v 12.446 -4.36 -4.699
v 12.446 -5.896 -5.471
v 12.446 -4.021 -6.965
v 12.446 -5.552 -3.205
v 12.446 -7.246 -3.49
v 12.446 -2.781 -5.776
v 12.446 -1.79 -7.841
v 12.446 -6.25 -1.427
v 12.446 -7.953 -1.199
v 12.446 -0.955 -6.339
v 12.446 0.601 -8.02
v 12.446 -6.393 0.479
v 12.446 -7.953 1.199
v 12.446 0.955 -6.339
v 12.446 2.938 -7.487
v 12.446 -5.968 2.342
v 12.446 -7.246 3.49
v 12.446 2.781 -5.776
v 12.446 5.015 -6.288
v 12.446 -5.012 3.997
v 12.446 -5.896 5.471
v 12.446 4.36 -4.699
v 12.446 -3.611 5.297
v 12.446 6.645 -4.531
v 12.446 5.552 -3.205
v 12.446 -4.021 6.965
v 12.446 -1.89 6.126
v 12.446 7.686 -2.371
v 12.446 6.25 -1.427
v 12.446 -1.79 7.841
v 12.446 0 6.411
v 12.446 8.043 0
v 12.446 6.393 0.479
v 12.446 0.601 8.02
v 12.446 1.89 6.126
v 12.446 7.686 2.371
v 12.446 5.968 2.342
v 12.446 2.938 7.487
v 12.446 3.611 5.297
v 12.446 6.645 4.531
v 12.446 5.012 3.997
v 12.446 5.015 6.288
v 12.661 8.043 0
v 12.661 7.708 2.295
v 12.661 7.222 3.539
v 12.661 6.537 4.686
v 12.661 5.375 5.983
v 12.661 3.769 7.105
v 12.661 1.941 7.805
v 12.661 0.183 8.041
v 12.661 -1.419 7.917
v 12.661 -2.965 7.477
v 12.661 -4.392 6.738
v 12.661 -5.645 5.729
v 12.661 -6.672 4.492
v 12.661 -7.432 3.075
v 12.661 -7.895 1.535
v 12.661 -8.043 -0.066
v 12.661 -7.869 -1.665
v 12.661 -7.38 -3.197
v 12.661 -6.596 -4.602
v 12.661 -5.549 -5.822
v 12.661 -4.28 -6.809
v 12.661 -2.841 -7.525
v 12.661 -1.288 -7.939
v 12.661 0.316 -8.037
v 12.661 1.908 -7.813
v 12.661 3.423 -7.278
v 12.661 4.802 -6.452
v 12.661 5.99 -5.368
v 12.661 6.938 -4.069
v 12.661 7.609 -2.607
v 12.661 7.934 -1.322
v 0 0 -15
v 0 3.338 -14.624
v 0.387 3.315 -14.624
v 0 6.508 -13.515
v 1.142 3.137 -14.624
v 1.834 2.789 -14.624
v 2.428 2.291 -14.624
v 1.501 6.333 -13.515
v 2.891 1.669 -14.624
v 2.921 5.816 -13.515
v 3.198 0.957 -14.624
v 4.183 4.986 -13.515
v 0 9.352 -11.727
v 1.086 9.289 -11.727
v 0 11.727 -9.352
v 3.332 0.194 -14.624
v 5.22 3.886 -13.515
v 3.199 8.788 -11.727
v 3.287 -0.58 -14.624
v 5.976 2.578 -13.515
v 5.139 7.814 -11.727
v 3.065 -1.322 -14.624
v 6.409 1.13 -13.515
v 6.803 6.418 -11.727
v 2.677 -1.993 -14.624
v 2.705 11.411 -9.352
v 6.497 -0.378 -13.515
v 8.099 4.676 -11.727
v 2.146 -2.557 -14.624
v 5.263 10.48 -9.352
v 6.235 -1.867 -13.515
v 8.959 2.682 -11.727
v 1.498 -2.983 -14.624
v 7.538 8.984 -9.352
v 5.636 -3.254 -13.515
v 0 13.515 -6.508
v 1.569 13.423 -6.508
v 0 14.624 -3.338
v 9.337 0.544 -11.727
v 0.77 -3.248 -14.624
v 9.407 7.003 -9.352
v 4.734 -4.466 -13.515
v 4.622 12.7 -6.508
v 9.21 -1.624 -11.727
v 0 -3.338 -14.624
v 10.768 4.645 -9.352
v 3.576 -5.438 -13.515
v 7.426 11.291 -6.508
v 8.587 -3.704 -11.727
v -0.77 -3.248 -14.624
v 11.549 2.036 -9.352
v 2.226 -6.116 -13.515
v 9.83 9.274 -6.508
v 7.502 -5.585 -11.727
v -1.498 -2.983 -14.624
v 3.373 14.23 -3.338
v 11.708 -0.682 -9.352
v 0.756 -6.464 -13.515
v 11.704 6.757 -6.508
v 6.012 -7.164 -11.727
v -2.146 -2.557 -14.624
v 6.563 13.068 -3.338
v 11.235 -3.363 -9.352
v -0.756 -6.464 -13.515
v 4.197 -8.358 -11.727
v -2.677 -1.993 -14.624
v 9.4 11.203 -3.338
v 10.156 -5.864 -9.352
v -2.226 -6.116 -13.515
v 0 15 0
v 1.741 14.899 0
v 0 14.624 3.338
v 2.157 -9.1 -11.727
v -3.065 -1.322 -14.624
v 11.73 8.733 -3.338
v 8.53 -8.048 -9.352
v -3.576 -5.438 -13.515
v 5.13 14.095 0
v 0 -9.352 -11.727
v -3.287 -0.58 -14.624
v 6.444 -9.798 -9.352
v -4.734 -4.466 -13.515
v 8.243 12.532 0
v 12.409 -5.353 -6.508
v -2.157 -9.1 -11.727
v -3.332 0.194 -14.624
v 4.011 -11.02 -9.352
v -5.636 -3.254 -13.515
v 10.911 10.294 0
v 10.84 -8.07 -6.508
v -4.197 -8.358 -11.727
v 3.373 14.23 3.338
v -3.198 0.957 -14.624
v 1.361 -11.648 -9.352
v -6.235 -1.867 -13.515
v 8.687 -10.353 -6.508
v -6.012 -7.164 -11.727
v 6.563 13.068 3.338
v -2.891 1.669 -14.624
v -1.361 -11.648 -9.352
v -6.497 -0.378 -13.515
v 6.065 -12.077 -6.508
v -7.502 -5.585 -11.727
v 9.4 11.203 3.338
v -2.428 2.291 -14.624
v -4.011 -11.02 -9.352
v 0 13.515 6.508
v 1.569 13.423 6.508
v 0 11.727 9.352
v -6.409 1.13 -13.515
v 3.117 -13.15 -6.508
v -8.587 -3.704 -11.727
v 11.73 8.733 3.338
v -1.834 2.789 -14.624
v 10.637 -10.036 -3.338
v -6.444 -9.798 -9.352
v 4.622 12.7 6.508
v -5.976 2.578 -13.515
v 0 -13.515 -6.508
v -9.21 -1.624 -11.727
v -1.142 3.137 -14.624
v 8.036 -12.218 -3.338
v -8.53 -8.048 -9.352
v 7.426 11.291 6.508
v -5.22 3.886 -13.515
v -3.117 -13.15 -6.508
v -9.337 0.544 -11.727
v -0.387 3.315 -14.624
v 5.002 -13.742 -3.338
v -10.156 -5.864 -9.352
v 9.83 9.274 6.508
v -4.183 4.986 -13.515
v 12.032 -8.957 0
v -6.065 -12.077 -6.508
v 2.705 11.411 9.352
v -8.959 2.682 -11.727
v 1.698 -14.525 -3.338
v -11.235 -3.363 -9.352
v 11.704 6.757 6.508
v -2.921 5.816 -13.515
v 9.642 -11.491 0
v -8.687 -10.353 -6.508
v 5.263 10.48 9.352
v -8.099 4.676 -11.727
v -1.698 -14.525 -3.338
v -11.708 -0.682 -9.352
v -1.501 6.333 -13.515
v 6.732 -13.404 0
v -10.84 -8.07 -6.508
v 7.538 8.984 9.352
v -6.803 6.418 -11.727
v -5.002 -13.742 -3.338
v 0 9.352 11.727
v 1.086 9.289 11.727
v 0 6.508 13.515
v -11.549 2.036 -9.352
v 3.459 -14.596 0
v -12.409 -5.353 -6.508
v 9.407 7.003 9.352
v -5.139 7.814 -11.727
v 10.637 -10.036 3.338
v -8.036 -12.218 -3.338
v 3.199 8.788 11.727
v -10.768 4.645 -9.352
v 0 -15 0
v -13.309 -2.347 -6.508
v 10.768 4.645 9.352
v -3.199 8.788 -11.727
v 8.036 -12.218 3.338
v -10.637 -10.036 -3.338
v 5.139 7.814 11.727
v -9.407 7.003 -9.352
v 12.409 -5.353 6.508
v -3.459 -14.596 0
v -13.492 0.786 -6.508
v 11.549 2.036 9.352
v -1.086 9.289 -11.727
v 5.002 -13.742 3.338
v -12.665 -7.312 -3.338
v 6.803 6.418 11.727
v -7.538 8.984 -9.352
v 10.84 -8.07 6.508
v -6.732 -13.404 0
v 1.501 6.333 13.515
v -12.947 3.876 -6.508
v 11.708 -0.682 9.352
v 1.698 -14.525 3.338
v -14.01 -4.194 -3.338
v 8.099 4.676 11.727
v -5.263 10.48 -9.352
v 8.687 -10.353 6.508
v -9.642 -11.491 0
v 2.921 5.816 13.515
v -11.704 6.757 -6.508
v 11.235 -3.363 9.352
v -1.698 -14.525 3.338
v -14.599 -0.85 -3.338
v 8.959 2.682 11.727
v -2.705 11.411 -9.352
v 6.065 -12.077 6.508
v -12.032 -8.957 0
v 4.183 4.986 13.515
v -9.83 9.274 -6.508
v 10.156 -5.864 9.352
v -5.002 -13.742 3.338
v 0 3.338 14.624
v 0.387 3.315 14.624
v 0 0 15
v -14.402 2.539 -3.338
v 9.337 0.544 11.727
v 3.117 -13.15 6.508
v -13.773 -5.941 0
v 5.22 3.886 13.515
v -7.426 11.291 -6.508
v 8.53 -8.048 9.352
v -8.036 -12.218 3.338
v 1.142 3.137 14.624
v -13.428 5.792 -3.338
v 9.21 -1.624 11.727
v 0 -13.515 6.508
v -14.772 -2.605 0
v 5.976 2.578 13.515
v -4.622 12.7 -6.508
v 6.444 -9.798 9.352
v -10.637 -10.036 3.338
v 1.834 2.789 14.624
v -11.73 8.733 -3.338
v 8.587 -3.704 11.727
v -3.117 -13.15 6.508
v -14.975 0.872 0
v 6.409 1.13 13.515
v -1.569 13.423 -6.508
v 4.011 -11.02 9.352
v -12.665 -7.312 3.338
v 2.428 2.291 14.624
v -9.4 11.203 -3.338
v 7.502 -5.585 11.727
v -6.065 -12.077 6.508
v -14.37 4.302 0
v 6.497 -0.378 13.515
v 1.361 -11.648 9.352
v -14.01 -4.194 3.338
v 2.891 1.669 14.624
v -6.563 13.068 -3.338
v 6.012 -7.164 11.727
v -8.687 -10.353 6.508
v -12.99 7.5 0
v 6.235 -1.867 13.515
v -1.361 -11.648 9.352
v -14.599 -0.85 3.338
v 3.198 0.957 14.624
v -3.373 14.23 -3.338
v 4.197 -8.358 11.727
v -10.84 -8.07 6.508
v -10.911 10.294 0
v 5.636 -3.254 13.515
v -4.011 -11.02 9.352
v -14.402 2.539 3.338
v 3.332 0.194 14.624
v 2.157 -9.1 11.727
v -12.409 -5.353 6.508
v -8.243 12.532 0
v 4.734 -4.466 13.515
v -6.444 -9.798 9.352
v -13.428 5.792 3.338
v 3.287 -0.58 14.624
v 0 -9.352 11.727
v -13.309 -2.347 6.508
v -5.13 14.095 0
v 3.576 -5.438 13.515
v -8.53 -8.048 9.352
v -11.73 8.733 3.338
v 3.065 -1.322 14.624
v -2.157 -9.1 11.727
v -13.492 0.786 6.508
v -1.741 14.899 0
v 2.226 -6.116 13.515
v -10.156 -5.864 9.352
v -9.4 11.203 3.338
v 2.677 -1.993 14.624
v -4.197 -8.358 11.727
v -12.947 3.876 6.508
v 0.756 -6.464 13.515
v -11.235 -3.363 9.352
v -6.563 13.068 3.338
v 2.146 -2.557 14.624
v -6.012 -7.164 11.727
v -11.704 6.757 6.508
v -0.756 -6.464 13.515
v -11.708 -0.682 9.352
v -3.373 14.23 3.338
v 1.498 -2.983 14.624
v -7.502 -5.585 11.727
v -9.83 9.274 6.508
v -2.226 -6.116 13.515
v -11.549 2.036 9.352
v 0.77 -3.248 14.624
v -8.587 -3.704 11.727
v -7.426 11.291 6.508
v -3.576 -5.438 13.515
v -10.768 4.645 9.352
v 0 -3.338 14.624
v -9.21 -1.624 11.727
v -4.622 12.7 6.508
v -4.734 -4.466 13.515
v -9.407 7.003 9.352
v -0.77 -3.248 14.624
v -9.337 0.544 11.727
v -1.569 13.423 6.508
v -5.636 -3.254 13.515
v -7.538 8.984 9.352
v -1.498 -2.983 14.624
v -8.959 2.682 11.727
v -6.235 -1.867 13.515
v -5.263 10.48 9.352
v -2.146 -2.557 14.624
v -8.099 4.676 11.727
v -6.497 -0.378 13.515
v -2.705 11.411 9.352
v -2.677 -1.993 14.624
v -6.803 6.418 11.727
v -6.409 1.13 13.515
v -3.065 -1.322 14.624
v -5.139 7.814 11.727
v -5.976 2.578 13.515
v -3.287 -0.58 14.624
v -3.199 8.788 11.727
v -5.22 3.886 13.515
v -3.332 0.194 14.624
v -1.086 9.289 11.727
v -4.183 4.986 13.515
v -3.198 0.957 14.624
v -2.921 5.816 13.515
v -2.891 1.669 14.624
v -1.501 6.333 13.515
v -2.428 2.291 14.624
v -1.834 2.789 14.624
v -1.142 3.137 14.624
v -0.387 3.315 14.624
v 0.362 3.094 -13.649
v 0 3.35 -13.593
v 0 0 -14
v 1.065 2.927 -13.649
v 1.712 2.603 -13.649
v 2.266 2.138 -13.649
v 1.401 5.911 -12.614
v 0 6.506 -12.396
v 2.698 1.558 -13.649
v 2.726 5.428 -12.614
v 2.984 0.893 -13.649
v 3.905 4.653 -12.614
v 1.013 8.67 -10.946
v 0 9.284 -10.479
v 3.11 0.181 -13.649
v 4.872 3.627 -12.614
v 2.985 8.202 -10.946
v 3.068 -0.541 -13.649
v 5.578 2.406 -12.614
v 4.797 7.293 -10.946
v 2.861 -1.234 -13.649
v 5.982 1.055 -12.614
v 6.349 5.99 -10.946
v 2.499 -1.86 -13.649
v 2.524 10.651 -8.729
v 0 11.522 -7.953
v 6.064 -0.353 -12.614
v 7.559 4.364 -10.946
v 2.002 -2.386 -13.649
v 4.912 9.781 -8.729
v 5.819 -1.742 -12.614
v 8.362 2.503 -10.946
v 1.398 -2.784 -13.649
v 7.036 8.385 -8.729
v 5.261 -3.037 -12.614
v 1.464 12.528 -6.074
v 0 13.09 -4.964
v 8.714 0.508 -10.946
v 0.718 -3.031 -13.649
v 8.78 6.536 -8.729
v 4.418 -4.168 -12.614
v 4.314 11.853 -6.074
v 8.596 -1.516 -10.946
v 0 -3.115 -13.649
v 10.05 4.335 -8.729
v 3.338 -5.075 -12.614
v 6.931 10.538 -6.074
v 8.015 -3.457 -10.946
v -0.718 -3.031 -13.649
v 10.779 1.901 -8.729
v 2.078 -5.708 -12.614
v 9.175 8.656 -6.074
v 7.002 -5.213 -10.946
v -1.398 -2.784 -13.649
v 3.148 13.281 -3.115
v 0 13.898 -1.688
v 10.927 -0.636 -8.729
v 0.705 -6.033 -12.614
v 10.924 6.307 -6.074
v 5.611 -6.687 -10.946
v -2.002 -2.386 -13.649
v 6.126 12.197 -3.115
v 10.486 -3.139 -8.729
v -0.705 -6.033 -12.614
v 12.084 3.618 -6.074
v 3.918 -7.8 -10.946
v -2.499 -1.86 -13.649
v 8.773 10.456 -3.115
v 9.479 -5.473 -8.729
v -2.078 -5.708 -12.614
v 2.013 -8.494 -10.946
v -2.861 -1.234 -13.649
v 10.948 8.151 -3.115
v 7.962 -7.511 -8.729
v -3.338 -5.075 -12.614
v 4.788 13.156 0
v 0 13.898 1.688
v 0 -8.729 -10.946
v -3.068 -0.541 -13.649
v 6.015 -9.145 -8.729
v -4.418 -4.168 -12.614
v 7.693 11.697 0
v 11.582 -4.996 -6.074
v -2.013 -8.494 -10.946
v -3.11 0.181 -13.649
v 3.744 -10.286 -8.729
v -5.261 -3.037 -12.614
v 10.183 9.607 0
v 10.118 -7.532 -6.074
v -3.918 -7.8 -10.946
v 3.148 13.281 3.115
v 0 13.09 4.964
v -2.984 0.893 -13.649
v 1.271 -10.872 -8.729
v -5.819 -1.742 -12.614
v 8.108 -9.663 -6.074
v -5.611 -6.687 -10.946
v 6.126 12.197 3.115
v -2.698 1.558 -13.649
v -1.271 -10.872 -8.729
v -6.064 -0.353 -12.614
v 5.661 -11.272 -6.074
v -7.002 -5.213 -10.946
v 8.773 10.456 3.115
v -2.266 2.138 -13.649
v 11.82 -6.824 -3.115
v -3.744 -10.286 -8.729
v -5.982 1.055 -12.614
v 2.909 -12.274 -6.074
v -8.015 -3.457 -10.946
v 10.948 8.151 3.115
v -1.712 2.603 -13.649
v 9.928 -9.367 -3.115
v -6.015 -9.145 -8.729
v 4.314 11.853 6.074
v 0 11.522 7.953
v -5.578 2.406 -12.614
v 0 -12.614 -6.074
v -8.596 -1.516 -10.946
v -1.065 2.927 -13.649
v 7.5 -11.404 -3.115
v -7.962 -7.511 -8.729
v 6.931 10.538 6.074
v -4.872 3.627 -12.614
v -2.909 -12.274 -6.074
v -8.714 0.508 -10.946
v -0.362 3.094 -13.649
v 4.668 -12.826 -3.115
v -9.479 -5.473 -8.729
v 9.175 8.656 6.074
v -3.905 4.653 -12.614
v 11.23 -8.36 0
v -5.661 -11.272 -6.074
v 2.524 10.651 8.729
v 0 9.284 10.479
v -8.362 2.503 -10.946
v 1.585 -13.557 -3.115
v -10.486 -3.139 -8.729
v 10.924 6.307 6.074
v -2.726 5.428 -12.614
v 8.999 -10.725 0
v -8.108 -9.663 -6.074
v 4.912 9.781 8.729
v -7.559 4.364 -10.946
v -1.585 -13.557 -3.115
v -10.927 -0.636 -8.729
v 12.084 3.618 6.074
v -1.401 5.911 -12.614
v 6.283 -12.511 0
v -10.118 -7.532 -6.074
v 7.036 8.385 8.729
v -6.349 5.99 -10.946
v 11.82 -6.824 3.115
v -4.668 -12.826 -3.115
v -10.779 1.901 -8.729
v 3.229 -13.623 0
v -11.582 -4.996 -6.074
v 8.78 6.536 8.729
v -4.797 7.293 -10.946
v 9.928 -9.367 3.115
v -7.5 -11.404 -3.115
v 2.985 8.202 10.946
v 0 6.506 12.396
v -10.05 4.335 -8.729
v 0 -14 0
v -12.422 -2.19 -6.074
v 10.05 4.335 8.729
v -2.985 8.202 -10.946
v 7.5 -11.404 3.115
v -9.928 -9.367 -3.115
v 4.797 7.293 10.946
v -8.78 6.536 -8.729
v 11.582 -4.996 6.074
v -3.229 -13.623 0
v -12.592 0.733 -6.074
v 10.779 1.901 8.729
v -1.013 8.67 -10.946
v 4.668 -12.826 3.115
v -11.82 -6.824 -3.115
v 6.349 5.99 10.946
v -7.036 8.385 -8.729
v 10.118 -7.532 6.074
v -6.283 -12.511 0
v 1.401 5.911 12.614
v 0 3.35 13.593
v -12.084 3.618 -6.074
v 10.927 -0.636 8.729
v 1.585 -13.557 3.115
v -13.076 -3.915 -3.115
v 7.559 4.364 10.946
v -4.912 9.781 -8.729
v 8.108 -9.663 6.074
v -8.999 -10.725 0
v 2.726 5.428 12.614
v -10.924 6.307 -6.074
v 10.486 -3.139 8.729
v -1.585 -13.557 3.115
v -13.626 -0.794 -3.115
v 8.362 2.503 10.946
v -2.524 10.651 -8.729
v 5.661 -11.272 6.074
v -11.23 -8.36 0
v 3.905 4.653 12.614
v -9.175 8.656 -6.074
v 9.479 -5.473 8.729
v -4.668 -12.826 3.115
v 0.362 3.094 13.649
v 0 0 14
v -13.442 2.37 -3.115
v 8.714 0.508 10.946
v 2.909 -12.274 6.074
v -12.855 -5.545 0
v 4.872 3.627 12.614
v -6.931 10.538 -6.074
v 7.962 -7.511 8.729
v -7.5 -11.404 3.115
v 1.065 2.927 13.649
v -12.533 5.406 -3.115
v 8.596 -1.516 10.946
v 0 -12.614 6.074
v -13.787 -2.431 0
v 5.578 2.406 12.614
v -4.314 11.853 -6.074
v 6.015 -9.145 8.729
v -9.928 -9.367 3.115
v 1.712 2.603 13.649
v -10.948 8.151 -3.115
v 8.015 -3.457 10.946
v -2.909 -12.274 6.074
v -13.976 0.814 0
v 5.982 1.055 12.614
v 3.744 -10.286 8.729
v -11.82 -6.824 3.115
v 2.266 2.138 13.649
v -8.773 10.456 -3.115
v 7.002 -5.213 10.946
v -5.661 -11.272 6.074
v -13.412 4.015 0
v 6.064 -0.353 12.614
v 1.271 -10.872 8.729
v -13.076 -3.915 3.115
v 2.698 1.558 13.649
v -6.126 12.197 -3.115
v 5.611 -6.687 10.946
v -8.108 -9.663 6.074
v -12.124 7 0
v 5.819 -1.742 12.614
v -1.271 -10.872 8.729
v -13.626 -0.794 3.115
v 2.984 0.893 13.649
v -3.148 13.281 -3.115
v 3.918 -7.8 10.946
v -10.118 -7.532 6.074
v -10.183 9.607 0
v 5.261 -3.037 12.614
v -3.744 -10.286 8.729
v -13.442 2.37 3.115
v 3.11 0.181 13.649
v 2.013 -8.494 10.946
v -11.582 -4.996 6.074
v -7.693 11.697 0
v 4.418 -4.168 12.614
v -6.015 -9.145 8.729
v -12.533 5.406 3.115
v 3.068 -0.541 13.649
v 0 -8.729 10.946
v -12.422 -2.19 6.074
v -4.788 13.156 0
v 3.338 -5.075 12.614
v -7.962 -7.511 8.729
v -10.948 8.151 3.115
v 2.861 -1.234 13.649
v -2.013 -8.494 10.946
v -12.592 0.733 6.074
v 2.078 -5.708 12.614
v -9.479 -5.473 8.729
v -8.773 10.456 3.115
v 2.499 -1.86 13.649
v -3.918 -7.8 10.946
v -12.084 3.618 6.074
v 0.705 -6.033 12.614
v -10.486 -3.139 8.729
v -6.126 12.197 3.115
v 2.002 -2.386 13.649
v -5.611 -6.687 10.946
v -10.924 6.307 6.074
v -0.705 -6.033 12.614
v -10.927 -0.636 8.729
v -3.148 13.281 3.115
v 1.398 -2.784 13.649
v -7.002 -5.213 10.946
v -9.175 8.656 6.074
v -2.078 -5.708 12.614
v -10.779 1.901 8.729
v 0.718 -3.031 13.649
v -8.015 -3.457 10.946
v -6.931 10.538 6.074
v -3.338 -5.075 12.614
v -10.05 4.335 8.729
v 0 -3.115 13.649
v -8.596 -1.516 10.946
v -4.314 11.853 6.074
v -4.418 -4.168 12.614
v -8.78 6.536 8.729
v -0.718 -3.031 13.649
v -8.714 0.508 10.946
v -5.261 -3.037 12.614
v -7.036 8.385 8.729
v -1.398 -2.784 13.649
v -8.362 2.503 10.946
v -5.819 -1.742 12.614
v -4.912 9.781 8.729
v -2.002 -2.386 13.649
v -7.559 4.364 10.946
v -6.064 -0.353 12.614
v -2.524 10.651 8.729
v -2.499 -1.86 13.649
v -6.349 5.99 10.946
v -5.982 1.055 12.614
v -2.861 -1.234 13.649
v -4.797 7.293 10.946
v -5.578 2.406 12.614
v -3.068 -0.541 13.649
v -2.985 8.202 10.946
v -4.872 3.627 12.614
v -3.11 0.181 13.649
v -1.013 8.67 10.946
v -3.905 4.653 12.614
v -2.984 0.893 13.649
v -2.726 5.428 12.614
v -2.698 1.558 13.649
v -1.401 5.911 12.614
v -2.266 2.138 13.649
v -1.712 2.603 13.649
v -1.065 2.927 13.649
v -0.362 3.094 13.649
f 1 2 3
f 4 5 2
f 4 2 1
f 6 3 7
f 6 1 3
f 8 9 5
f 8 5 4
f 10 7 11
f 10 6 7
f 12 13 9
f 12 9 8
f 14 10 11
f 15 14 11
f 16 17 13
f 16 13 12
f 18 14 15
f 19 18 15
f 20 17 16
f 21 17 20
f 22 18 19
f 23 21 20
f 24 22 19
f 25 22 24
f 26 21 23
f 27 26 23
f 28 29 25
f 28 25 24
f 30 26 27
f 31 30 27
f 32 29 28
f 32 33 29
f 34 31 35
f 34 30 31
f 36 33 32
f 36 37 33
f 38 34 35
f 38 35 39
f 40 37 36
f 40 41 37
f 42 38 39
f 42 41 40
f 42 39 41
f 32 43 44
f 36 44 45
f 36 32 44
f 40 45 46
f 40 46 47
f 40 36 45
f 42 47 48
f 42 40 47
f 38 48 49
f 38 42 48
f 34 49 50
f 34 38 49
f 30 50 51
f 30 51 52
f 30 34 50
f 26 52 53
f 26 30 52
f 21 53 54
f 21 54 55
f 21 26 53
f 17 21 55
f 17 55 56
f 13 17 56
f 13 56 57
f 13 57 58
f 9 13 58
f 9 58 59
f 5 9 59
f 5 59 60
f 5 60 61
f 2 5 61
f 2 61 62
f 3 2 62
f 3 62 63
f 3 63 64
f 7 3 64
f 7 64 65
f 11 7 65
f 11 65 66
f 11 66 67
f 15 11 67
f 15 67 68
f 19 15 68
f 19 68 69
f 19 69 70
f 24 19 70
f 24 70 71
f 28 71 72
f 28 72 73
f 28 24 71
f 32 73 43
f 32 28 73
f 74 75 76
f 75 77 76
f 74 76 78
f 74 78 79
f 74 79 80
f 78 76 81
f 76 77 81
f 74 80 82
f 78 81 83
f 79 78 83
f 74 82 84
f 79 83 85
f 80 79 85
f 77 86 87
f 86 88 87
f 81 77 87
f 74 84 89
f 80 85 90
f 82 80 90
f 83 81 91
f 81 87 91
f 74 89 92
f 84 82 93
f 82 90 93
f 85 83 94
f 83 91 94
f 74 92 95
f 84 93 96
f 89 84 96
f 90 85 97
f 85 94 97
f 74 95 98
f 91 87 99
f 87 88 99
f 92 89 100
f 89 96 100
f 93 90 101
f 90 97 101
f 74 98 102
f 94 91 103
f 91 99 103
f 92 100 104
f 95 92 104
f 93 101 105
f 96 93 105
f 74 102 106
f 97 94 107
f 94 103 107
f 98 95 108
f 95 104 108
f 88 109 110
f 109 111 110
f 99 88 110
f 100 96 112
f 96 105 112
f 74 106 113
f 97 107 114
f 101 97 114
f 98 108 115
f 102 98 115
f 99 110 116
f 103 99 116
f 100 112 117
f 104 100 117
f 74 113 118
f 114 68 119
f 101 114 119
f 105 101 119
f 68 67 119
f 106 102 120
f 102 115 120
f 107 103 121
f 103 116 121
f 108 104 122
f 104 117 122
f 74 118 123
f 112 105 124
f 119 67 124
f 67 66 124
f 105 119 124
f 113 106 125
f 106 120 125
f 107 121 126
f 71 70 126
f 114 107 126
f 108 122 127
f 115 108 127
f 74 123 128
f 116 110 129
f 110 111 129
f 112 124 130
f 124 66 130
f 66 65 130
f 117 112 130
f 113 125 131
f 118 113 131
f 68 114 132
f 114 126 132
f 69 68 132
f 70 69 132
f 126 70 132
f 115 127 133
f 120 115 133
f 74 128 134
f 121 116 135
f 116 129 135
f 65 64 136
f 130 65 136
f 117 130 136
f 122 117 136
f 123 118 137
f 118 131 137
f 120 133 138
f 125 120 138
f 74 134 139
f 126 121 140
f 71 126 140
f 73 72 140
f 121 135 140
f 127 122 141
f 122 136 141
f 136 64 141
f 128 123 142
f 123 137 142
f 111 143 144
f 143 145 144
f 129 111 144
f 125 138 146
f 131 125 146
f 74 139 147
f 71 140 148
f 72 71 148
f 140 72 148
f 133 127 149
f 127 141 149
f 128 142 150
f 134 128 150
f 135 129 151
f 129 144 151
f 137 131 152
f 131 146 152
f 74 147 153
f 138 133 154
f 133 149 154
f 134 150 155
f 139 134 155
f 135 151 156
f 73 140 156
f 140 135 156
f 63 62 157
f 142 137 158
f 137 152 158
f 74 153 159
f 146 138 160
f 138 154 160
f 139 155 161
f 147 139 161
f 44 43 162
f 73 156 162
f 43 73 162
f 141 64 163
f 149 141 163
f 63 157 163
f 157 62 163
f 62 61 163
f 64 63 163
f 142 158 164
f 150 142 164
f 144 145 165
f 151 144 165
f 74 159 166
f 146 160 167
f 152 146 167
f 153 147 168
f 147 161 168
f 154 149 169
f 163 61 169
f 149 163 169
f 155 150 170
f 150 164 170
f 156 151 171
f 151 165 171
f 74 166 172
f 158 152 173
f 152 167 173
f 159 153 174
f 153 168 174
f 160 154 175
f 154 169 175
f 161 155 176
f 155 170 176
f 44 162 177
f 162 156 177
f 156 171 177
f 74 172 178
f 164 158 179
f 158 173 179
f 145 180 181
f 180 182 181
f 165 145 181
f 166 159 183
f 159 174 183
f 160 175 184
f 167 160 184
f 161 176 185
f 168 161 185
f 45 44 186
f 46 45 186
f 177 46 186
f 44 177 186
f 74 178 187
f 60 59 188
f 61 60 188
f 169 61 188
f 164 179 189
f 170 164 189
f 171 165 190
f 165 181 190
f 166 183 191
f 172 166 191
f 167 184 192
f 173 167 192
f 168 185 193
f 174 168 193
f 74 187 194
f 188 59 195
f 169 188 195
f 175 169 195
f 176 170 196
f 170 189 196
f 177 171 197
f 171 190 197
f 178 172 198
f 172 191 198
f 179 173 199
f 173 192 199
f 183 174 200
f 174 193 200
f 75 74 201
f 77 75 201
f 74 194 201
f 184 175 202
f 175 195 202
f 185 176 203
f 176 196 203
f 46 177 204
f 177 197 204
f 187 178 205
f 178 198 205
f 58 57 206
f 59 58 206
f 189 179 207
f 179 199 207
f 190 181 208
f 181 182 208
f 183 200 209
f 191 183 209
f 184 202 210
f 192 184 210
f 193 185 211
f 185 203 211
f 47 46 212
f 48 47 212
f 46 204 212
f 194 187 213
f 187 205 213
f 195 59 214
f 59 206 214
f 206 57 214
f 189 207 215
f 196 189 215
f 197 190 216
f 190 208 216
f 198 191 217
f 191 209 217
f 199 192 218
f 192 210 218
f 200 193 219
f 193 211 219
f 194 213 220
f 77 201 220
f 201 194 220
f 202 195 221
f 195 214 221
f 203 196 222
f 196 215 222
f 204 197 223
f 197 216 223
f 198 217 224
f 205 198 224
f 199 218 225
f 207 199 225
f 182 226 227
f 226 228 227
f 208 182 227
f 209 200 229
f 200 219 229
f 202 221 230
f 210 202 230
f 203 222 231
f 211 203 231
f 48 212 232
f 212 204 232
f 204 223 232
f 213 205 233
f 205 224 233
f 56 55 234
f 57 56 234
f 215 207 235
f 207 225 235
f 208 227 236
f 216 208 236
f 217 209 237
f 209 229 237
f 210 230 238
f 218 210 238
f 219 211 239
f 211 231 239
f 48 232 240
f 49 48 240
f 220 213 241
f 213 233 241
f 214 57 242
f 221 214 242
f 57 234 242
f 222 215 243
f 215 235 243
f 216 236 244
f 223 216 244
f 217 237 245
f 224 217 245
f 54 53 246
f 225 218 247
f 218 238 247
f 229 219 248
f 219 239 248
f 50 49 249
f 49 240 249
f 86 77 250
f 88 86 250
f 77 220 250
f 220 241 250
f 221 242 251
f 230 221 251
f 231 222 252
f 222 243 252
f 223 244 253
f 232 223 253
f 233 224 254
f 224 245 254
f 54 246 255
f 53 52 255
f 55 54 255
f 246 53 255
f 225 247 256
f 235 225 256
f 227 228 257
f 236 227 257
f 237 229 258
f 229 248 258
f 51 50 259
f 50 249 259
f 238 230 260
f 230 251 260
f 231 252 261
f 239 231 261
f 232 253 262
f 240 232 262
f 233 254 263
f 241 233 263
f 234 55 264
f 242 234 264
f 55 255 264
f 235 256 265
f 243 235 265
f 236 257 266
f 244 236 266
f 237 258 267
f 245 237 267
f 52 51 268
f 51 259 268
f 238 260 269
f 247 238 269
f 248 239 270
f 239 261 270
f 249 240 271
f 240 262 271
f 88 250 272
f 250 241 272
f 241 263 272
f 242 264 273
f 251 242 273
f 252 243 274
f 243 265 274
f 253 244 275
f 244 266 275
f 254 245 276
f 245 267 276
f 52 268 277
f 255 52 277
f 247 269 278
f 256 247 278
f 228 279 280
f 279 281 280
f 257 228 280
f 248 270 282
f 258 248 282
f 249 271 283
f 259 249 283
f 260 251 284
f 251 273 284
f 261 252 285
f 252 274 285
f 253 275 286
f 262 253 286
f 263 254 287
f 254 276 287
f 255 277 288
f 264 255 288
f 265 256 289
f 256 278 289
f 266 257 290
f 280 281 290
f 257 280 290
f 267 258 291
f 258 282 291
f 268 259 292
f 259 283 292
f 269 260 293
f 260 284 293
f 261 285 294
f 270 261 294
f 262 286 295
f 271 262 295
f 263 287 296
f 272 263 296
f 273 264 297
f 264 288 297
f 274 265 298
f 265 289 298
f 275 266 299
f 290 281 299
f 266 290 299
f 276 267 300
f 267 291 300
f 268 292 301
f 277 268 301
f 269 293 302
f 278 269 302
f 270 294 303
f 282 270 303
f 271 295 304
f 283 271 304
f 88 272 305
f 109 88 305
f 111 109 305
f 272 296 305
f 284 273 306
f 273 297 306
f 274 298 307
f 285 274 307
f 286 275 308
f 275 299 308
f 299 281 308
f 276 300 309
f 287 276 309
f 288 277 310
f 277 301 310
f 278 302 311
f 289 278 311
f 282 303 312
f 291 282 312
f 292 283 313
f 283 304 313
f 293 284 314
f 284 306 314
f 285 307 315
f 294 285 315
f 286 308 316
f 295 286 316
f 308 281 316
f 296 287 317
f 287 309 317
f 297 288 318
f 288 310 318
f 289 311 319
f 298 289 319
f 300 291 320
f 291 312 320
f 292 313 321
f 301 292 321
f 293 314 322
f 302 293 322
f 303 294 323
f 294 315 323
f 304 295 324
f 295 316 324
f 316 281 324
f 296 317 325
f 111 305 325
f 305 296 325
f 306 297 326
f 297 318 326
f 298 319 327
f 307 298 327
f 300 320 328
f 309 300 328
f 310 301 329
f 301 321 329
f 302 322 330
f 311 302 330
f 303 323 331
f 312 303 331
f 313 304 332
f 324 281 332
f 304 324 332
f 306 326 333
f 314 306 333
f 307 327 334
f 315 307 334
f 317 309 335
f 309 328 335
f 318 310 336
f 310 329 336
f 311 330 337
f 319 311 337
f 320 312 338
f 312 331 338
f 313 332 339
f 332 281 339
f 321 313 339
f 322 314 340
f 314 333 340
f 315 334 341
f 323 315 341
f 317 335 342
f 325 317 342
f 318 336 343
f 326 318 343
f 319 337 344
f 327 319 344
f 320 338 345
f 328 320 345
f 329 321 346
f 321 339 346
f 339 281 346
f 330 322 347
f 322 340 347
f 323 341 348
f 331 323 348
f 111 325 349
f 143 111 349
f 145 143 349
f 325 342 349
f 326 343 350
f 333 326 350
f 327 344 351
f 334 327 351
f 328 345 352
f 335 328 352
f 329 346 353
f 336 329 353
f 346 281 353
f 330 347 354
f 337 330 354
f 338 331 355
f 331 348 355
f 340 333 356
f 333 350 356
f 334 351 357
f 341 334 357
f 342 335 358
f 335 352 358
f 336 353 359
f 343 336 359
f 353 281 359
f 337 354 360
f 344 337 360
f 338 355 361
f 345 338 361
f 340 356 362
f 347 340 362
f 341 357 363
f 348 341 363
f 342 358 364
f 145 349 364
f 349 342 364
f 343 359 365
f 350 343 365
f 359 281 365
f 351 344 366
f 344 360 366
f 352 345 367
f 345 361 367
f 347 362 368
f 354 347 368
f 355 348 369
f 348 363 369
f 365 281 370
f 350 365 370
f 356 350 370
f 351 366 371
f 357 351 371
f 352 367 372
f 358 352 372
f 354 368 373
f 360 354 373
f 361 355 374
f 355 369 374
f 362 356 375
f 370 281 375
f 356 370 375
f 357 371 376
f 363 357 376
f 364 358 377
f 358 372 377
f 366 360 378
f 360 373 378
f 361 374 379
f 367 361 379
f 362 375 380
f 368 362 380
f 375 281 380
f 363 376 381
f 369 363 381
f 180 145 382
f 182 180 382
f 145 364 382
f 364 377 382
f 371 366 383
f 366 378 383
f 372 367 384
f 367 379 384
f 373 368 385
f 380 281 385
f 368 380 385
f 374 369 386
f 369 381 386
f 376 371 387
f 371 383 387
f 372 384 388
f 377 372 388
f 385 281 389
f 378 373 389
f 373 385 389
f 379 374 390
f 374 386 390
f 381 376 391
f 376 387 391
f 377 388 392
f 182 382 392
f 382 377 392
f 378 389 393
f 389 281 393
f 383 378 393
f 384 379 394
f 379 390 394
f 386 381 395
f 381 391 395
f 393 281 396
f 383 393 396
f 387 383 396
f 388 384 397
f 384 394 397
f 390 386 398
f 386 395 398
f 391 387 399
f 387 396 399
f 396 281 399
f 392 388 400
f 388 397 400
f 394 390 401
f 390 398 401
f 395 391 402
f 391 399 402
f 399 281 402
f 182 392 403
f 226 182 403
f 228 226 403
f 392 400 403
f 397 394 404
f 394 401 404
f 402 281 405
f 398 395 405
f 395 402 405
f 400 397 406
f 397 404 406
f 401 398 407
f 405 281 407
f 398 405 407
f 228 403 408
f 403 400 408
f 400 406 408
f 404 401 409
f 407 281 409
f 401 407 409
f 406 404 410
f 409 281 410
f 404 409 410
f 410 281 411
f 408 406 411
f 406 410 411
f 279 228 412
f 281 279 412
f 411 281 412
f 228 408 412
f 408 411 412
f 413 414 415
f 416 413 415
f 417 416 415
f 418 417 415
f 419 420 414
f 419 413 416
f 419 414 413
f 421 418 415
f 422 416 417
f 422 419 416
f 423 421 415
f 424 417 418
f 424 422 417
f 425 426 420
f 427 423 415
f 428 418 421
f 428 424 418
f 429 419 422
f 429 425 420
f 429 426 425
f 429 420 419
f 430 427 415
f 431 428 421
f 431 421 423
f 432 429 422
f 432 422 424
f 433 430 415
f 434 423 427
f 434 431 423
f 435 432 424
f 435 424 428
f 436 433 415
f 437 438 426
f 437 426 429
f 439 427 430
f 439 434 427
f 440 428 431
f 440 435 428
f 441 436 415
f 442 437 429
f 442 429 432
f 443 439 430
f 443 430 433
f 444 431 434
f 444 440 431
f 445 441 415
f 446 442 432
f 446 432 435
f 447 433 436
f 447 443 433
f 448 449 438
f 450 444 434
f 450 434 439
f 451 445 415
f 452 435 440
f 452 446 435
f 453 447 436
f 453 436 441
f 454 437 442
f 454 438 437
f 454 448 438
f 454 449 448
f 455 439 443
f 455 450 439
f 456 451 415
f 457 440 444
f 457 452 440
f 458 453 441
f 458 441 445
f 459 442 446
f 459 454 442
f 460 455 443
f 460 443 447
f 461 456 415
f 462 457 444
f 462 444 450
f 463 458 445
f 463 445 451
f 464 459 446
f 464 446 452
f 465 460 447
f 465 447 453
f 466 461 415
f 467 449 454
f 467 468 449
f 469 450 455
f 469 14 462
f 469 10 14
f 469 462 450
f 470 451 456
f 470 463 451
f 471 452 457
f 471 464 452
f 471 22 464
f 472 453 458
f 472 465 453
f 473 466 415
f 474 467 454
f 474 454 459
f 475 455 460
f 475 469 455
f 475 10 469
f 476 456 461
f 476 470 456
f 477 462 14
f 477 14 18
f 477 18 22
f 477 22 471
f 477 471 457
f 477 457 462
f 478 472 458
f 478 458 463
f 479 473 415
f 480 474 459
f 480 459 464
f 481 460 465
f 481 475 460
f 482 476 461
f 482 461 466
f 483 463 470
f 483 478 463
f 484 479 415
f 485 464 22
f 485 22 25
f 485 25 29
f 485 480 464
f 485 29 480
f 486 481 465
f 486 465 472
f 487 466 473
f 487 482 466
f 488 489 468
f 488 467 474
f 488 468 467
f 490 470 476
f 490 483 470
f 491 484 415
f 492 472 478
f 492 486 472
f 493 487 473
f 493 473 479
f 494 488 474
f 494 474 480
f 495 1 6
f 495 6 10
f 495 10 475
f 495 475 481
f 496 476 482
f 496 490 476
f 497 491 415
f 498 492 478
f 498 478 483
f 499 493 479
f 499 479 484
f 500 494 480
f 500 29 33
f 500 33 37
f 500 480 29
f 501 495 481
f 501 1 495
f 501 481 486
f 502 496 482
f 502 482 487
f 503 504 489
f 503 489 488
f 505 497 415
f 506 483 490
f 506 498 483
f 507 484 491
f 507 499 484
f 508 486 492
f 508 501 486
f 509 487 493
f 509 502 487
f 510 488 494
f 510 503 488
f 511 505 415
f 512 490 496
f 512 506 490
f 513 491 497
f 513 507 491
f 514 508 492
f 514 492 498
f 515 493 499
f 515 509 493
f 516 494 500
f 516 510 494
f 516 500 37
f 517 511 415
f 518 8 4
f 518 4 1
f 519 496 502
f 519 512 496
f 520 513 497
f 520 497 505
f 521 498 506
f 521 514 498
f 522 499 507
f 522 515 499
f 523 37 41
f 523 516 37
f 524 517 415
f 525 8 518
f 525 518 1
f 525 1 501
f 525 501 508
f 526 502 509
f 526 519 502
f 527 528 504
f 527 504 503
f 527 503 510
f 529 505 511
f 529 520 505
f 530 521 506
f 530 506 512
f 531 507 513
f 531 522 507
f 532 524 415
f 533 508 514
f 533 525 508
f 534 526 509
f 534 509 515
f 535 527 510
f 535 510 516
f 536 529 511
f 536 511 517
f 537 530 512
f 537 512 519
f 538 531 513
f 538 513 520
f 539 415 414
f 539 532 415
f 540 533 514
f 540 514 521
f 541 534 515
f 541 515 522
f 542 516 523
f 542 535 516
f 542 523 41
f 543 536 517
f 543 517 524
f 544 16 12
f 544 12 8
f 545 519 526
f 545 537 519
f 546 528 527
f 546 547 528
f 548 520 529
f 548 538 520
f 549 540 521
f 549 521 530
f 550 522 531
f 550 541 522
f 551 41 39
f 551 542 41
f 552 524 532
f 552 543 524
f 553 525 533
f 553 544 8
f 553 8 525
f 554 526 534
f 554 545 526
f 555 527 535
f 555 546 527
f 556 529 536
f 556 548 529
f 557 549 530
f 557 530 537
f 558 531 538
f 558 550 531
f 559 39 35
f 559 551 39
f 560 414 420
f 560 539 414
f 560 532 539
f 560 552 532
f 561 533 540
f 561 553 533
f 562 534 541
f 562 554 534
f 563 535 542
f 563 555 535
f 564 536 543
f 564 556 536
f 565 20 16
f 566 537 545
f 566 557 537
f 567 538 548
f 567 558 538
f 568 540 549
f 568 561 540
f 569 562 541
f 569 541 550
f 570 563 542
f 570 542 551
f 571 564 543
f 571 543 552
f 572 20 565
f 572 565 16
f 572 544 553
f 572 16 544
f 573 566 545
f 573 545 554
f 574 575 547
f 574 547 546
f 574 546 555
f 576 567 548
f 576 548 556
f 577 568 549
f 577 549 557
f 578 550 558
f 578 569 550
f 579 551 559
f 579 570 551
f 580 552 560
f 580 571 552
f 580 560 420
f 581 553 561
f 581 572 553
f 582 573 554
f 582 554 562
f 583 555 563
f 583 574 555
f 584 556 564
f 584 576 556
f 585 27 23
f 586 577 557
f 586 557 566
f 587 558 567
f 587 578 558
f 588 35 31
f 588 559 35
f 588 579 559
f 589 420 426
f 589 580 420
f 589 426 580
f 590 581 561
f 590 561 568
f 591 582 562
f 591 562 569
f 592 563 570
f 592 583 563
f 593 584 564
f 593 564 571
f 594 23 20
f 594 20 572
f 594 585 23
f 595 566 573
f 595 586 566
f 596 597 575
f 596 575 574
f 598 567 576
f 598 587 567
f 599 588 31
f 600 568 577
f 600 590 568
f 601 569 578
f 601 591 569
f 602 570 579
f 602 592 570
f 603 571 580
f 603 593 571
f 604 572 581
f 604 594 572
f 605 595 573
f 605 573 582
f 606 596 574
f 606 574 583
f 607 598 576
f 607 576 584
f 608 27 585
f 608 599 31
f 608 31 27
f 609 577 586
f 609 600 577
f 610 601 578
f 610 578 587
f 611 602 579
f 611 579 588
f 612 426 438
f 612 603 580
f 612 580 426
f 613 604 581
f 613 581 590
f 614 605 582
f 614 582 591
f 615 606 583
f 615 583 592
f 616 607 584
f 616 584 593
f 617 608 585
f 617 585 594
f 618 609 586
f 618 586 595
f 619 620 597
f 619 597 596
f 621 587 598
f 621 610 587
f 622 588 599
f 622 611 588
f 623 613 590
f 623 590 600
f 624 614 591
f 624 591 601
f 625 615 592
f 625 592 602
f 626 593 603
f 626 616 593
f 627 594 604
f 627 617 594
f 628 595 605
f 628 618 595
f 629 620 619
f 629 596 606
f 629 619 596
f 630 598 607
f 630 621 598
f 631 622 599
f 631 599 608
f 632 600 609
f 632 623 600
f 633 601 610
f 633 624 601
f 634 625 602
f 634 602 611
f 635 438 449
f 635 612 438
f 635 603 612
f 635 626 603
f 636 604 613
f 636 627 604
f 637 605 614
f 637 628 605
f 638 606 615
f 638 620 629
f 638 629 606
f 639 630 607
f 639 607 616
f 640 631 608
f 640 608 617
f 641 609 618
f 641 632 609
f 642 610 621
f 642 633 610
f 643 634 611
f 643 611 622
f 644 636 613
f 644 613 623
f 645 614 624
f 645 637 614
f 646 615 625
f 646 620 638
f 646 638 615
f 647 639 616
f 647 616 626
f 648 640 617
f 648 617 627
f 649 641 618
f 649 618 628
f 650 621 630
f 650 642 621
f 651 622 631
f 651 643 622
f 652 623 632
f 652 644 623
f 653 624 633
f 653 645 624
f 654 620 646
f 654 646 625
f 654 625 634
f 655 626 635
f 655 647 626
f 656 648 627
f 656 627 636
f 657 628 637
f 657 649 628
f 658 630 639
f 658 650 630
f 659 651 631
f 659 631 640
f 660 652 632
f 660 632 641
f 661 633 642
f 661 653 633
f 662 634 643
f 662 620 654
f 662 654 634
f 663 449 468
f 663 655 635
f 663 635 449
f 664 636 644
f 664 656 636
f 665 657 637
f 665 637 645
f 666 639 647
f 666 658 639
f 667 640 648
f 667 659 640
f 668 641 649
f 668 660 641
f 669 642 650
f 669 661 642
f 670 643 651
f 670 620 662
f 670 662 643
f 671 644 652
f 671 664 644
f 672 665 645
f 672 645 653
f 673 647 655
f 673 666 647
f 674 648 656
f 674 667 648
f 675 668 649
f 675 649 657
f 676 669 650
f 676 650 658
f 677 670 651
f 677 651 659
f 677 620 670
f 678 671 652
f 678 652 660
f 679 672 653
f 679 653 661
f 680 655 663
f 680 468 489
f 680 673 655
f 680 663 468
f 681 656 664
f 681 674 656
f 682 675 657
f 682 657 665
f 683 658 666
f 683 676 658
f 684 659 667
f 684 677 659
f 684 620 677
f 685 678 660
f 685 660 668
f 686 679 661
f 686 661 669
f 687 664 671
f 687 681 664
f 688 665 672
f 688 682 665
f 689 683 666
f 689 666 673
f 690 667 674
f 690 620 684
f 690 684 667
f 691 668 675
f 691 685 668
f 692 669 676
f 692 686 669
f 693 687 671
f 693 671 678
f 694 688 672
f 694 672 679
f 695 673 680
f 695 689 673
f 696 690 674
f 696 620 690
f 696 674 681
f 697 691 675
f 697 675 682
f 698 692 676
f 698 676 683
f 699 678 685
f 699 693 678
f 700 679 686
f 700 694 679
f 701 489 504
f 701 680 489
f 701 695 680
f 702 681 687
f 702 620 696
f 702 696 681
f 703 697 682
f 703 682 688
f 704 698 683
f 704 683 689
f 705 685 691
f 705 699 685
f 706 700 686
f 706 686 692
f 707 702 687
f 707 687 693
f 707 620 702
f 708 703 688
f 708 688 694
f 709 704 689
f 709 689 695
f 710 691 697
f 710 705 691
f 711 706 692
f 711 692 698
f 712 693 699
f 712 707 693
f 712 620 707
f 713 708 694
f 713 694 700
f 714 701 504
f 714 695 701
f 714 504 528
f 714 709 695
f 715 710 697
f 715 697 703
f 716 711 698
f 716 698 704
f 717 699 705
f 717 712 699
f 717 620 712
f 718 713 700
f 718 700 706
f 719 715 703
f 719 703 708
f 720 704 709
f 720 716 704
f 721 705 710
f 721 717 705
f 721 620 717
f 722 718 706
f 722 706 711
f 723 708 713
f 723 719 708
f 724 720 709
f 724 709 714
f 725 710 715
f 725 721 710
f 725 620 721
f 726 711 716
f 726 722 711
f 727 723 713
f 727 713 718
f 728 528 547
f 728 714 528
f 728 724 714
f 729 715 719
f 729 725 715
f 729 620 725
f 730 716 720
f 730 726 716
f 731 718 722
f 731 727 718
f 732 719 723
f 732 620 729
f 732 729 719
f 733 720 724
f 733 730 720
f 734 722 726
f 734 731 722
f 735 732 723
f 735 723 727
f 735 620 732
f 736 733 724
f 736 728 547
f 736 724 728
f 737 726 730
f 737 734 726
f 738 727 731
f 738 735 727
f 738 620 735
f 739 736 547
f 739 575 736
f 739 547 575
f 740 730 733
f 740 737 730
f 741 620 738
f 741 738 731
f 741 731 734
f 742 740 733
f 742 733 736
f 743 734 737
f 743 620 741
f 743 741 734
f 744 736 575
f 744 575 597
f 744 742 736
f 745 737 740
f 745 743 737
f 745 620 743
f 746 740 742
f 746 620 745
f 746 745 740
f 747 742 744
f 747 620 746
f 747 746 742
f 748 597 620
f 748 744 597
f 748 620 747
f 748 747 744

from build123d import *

# Parameters (mm, degrees)
F4_T     = -1
F3_R     = 8.042846649
F5_DEPTH = 25.4


with BuildPart() as f1:
    # F0 (on Right) → F1 (revolve)
    with BuildSketch(Plane.YZ):
        with BuildLine():
            ThreePointArc((0, -15), (10.6066017178, -10.6066017178), (15, 0))
            ThreePointArc((15, 0), (10.6066017178, 10.6066017178), (0, 15))
            Line((0, 15), (0, -15))
        make_face()
    revolve(axis=Axis((0, 0, 0), (0, 0, -1)))

    # F4 (hollow: no face is removed)
    offset(amount=F4_T, mode=Mode.SUBTRACT)

    # F3 (on offset) → F5 (cut)
    with BuildSketch(Plane.YZ.offset(12.446)):
        Circle(F3_R)
    extrude(amount=F5_DEPTH, mode=Mode.SUBTRACT)


solid = f1.part
